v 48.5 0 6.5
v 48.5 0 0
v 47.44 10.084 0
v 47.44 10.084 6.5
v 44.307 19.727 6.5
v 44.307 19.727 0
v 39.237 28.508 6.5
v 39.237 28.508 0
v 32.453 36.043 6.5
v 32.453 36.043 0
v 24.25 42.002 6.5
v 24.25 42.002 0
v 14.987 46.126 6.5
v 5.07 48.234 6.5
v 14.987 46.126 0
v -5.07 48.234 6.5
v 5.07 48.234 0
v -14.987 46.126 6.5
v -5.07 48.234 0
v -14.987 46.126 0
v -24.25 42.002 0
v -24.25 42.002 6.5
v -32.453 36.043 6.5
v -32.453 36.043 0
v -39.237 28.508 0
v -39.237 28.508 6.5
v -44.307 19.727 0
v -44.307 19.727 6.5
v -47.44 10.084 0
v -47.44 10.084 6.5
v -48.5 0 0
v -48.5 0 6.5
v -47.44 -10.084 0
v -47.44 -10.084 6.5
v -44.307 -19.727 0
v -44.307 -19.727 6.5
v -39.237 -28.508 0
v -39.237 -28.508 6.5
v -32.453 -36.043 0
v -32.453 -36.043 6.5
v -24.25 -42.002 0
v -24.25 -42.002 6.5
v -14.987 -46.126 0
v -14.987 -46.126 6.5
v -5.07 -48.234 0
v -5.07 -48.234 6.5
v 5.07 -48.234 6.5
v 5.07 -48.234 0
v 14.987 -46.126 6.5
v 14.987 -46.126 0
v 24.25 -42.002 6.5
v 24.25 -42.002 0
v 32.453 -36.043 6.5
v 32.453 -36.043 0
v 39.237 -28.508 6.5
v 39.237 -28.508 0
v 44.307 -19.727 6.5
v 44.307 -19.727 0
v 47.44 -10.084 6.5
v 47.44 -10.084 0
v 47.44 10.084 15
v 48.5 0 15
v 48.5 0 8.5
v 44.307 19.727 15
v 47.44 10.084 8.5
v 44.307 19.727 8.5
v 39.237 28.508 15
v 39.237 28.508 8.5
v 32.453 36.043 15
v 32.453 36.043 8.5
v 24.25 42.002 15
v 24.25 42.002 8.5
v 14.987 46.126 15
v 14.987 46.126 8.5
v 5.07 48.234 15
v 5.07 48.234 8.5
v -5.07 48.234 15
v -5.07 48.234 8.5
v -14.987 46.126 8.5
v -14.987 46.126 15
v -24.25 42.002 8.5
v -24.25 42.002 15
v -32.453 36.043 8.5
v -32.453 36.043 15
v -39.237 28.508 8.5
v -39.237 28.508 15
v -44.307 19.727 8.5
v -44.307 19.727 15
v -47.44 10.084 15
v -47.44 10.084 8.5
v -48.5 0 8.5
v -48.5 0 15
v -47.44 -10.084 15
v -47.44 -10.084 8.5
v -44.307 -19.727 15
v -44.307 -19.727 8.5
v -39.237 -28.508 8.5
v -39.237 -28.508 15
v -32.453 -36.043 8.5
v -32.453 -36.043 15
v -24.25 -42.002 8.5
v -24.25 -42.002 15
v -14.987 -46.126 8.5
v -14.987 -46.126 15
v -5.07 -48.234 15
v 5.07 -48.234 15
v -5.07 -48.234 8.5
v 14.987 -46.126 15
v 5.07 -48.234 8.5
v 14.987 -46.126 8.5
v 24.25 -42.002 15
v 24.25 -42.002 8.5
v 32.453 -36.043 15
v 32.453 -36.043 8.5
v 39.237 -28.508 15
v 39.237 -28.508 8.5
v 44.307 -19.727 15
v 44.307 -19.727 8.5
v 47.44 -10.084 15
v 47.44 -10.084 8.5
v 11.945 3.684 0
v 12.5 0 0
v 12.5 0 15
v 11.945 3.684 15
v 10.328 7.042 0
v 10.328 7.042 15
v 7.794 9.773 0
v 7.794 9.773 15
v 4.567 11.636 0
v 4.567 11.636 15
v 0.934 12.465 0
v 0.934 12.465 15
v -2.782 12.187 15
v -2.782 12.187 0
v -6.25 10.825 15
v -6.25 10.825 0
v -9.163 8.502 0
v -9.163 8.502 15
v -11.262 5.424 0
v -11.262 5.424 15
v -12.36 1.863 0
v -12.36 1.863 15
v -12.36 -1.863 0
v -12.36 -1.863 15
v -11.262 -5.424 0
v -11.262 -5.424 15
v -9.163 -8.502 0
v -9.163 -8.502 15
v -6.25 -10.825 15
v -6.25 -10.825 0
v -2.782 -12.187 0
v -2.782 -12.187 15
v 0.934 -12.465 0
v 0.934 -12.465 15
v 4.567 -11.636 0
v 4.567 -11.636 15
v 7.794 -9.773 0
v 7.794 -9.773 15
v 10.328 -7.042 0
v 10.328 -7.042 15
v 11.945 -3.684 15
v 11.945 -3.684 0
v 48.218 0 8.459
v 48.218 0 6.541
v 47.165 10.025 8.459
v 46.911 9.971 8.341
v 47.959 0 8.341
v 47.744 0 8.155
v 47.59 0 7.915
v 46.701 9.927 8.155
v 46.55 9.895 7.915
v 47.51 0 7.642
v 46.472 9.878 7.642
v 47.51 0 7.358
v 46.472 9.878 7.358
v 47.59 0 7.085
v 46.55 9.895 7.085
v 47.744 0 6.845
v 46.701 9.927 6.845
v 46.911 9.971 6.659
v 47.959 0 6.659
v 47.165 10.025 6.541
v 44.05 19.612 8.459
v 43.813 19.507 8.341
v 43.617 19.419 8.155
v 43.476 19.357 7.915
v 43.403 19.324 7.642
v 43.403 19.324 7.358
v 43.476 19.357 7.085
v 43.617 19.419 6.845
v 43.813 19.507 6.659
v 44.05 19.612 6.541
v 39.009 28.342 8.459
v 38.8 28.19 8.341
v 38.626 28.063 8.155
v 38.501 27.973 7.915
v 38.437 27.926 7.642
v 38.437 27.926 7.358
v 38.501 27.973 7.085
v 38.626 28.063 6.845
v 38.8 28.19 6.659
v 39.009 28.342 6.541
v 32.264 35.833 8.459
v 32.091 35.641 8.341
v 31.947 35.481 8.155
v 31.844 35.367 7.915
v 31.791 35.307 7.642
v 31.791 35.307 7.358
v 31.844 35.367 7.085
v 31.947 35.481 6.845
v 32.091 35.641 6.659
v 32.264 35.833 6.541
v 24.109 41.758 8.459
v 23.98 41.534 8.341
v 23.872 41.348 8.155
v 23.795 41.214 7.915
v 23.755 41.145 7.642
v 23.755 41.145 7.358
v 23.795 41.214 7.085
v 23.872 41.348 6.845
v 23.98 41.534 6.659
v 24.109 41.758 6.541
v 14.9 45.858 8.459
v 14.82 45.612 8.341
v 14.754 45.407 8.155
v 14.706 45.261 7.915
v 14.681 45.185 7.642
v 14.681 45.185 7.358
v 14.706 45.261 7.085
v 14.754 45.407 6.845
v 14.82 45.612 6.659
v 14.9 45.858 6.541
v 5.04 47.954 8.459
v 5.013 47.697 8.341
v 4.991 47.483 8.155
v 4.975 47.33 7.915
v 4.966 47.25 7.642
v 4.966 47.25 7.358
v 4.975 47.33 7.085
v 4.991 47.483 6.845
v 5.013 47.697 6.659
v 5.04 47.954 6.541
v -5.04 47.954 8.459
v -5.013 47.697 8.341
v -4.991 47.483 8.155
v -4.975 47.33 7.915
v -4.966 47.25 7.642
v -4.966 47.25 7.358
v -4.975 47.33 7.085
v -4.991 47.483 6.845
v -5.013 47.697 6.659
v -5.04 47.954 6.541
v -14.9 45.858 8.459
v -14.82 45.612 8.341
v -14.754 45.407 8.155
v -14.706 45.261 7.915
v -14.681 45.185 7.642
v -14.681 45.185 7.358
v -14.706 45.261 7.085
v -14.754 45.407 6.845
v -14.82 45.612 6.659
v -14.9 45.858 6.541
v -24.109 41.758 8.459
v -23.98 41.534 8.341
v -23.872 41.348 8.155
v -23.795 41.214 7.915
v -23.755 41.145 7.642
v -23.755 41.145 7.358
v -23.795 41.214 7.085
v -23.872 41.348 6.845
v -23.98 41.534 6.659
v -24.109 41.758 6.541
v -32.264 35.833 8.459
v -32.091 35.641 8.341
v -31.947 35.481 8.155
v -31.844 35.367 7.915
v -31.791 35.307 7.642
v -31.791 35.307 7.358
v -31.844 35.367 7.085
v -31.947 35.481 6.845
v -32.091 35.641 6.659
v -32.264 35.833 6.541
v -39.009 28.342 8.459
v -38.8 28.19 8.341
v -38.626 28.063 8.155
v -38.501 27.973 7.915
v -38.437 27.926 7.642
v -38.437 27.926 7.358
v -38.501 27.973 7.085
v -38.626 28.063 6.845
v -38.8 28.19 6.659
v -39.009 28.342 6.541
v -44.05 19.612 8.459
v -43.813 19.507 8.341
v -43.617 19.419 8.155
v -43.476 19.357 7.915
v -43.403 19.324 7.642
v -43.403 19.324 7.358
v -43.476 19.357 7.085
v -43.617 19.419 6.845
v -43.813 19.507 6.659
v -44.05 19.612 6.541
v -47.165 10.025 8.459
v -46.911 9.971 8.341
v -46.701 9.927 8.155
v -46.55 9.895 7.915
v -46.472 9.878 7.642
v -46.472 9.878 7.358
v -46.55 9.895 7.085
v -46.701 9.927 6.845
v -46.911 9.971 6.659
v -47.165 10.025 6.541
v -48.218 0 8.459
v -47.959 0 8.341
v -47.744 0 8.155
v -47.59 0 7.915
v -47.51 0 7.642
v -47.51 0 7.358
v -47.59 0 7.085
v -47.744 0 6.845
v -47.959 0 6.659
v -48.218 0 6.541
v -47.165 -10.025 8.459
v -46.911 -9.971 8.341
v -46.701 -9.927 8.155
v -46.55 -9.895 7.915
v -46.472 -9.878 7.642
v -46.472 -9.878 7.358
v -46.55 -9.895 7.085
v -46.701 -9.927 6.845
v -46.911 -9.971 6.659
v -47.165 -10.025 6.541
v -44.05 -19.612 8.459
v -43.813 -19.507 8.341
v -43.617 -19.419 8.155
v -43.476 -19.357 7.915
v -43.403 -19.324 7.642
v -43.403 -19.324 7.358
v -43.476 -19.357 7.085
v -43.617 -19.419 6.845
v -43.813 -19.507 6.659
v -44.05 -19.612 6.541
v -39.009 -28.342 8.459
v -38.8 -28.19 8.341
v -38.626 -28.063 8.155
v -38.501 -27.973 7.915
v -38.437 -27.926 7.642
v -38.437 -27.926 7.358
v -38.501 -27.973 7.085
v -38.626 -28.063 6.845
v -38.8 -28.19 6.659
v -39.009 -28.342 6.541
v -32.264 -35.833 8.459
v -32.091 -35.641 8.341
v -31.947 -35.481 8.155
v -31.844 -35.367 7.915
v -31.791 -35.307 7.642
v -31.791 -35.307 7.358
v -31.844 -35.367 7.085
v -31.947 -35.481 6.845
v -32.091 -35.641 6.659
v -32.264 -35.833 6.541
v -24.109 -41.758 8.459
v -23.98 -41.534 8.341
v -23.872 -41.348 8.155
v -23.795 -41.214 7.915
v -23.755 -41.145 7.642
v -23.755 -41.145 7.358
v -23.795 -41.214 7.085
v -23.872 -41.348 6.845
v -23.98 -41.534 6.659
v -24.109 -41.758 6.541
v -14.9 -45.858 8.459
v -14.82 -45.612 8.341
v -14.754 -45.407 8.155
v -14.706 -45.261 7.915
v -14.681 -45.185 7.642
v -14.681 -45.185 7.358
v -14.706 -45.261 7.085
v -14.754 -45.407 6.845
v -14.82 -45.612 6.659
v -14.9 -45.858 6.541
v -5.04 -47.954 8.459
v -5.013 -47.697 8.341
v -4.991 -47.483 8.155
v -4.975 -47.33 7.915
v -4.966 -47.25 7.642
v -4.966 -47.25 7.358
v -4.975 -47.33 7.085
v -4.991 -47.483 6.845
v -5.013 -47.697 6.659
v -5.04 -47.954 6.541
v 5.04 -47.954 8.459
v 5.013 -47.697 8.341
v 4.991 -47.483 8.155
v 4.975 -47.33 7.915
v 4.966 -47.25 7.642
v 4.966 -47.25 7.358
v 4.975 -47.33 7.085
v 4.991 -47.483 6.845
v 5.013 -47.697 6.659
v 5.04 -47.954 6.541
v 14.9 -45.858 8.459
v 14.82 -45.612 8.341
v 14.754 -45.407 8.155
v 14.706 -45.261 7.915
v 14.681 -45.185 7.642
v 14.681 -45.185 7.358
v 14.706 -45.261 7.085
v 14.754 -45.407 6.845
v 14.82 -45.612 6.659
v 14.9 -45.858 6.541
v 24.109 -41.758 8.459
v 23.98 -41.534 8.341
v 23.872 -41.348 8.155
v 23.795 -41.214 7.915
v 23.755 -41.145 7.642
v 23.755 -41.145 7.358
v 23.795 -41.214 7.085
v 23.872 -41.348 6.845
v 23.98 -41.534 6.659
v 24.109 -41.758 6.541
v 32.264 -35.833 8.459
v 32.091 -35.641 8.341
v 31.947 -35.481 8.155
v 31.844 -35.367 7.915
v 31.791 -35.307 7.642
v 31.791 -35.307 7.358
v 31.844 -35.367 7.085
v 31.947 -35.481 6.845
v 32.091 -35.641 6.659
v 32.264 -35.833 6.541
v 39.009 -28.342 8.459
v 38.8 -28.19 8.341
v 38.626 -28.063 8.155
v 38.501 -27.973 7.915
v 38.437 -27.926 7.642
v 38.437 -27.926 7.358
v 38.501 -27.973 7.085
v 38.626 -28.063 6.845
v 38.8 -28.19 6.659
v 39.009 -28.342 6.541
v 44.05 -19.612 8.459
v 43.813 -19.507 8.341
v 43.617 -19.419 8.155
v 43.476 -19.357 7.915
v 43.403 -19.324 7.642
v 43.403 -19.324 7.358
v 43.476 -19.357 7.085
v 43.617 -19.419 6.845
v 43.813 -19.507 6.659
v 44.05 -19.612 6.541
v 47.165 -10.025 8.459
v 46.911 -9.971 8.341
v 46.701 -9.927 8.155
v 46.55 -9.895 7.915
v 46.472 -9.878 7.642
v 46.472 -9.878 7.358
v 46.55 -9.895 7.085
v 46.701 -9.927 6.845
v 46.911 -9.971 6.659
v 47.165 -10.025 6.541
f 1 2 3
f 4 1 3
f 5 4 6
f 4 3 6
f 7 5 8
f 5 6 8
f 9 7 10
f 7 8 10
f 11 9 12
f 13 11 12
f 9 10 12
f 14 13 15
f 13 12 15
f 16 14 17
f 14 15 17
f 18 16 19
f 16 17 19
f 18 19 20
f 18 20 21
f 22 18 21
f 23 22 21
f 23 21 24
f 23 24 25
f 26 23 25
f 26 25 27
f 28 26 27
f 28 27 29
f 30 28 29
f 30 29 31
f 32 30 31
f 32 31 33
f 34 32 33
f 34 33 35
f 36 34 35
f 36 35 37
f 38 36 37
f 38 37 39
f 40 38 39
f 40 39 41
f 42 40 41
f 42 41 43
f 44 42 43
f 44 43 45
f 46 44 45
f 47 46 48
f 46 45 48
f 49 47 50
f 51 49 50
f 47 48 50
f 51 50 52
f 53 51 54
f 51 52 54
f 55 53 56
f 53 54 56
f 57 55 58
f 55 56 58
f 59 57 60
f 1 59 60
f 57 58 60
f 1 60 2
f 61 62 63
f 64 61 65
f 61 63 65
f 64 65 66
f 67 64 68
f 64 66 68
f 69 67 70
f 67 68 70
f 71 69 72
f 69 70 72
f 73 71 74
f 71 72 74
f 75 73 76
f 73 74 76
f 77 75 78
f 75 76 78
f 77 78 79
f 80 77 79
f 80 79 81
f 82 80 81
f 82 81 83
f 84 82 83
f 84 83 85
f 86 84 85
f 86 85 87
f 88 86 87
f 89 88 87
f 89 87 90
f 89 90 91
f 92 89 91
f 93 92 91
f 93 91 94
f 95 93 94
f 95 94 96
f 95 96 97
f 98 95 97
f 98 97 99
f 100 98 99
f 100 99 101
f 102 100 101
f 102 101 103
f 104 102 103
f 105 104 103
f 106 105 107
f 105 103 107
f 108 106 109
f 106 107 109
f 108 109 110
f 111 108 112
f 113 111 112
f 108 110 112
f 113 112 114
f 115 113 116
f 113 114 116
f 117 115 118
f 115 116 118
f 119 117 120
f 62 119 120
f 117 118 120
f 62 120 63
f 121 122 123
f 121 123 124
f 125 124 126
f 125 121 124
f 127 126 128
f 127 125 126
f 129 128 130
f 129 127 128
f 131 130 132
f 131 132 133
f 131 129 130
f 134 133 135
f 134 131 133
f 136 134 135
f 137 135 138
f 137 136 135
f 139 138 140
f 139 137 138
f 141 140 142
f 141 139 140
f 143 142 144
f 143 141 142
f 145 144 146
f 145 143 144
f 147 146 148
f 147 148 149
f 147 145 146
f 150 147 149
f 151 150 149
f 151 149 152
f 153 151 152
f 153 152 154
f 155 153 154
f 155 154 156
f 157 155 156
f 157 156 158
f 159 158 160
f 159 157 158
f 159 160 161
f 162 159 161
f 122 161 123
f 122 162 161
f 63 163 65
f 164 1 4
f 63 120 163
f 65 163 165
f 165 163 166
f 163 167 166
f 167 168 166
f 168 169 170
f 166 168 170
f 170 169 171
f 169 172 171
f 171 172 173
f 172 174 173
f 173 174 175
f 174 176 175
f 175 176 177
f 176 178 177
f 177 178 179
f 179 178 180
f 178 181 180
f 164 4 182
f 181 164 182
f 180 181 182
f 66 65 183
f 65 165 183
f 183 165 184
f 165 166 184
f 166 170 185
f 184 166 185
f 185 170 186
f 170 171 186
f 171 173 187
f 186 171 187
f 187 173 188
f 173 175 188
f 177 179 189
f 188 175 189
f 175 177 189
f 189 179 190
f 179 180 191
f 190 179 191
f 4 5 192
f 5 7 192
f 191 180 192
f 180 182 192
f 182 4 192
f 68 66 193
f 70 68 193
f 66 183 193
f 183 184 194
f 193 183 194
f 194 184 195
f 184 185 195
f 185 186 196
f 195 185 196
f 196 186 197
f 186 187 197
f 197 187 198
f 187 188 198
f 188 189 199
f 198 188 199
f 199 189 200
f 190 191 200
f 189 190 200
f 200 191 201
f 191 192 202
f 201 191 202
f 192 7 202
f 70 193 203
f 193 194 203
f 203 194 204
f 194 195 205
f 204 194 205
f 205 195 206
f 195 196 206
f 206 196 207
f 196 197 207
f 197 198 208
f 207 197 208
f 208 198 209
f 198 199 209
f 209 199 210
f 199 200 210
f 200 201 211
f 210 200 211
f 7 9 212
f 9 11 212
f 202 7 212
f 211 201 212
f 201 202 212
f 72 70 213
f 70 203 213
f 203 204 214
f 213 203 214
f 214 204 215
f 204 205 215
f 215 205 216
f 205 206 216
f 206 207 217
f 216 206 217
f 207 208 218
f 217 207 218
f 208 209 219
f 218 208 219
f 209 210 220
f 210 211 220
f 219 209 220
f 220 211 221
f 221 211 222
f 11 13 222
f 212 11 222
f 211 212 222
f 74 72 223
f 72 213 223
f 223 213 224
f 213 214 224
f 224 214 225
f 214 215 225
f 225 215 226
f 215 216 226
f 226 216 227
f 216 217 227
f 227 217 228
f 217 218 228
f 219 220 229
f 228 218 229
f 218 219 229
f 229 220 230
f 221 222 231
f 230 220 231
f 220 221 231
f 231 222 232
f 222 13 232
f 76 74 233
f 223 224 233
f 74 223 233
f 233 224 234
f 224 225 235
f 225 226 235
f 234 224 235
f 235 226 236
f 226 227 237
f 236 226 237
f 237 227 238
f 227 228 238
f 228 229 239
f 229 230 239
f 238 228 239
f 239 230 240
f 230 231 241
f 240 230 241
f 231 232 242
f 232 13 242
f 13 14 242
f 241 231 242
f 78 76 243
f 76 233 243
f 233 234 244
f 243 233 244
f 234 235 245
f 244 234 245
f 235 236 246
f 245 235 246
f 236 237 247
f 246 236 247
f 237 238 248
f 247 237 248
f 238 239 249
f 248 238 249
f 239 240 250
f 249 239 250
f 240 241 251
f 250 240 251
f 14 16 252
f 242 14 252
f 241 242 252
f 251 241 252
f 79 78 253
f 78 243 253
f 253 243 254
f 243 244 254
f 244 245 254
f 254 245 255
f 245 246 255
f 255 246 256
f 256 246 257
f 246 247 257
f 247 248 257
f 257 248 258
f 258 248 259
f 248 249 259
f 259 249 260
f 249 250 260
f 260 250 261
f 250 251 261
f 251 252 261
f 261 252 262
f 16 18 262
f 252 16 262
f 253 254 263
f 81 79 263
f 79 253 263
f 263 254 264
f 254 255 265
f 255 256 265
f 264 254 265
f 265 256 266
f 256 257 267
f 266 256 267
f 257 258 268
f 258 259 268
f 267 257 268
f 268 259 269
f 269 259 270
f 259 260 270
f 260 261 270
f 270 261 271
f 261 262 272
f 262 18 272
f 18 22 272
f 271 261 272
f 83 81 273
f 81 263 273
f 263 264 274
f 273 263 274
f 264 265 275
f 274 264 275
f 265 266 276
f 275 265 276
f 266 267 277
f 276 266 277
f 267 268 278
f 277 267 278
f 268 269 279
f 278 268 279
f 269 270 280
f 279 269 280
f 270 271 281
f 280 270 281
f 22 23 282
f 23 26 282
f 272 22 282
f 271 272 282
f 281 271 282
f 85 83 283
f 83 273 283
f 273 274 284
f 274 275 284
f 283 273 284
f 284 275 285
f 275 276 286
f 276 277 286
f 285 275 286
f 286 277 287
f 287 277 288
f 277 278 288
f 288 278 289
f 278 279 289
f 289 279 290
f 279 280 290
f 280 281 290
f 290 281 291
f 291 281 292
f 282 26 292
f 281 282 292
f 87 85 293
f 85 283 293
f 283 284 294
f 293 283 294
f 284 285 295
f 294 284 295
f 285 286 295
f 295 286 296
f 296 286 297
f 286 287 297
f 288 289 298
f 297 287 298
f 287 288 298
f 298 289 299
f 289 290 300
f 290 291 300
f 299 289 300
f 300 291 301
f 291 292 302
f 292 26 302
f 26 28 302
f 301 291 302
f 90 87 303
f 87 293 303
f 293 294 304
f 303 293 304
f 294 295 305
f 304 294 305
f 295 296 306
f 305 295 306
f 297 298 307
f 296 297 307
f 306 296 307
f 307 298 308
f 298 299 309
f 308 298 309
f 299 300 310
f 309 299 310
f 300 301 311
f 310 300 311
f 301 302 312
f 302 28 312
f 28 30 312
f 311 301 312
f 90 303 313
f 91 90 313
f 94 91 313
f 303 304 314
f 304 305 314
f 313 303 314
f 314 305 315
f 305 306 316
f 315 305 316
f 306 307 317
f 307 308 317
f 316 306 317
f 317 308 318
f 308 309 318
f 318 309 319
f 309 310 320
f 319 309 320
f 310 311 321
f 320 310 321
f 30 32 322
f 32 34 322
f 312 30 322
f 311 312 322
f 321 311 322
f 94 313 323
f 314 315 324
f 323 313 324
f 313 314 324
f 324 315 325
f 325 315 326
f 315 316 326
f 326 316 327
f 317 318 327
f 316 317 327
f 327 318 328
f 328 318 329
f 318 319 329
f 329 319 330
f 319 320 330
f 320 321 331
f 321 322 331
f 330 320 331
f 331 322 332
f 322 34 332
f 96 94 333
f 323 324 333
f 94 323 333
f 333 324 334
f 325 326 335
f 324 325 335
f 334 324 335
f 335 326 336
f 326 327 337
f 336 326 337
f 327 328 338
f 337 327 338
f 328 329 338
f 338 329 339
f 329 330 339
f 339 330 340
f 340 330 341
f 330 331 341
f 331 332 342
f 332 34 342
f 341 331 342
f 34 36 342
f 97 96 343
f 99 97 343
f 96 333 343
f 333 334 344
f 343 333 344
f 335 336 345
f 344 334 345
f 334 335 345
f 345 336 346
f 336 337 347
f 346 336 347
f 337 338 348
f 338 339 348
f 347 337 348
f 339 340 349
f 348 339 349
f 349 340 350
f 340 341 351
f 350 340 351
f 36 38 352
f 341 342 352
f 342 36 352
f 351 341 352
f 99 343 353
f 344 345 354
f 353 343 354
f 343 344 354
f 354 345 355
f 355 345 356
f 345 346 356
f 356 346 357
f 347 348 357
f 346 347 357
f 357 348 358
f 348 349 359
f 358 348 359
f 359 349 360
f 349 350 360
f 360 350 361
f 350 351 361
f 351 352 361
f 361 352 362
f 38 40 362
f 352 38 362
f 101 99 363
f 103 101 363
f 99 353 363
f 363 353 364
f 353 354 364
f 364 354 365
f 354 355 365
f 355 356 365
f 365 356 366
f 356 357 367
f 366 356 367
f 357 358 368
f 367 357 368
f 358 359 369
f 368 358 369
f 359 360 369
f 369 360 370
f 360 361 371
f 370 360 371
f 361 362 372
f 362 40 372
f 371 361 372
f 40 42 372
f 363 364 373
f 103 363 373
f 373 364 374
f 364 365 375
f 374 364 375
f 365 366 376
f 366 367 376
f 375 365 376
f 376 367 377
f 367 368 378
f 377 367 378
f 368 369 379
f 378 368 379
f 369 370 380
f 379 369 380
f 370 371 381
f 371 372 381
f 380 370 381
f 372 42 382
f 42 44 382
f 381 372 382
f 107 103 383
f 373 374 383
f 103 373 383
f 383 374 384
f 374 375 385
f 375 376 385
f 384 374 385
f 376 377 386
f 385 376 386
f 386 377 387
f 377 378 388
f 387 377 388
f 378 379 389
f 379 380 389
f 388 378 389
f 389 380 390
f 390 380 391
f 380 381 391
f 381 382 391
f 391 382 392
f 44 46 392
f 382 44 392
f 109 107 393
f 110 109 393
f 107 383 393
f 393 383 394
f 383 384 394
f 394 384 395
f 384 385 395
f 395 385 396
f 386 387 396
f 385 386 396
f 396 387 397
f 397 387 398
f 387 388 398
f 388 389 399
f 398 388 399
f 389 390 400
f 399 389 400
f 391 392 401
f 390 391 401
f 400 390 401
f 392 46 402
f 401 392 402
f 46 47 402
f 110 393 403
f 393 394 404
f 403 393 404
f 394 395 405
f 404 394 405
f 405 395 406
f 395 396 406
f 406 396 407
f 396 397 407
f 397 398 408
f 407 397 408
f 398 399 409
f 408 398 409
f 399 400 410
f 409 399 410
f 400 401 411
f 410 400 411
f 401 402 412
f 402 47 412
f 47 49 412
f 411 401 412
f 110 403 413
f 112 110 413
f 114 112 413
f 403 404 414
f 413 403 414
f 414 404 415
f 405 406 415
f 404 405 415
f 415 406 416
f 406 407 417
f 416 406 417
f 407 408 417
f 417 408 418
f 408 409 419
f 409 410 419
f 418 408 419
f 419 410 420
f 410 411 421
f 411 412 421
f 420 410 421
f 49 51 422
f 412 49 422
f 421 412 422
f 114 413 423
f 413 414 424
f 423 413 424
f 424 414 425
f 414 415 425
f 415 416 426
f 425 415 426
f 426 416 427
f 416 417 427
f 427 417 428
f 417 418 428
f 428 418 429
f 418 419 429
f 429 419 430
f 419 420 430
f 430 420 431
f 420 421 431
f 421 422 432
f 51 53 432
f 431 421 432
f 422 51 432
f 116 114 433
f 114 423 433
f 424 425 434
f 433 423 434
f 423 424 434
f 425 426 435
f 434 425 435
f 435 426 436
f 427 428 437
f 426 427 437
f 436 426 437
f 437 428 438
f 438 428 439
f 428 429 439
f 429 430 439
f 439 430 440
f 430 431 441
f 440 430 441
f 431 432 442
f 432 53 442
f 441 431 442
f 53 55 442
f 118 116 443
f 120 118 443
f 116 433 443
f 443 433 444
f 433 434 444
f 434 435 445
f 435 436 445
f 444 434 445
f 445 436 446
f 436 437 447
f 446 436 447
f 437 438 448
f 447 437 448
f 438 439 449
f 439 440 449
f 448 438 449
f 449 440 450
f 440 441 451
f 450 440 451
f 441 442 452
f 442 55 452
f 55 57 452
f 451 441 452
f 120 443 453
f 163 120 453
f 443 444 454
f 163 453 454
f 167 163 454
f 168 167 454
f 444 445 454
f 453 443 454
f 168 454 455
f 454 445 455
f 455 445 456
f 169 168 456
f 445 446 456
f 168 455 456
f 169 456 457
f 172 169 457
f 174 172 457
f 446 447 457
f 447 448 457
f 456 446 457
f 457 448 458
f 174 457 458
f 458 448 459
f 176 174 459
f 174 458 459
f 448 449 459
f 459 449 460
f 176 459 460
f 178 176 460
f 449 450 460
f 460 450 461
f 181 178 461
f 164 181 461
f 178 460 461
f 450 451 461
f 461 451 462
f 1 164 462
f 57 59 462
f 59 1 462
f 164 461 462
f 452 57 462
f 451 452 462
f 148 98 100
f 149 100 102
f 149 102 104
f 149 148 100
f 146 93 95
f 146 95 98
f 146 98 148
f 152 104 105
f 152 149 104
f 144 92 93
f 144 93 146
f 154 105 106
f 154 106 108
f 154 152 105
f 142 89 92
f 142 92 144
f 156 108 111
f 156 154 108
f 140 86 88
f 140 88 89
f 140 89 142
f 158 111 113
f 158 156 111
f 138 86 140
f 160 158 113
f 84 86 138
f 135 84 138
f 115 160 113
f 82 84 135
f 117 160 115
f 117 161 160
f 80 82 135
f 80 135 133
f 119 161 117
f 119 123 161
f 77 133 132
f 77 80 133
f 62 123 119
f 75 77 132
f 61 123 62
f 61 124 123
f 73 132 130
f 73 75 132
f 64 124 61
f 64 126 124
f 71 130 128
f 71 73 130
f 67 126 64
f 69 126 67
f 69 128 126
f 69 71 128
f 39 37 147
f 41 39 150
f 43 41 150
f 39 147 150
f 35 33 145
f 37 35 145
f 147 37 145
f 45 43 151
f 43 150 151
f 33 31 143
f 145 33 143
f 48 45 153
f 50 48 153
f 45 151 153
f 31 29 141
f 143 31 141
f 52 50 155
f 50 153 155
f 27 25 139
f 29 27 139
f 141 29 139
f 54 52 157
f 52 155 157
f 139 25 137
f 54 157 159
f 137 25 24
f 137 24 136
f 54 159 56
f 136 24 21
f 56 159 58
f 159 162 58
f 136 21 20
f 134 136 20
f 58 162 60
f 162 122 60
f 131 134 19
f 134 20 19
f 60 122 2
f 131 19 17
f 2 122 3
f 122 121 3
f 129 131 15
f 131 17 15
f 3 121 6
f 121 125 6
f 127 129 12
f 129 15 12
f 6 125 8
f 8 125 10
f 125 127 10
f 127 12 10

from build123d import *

# Parameters (mm, degrees)
F1_R     = 48.5
F2_DEPTH = 15
F5_R     = 12.5
F6_DEPTH = 15


with BuildPart() as f2:
    # F1 (on face) → F2 (new body)
    with BuildSketch(Plane.XY):
        Circle(F1_R)
    extrude(amount=F2_DEPTH)

    # F3 (on Front) → F4 (revolve, cut)
    with BuildSketch(Plane.XZ):
        with BuildLine():
            ThreePointArc((47.5, 7.5), (48.5, 6.5), (49.5, 7.5))
            ThreePointArc((49.5, 7.5), (48.5, 8.5), (47.5, 7.5))
        make_face()
    revolve(axis=Axis((0, 0, 8.376576), (0, 0, 1)), mode=Mode.SUBTRACT)

    # F5 (on Top) → F6 (cut)
    with BuildSketch(Plane.XY):
        Circle(F5_R)
    extrude(amount=F6_DEPTH, mode=Mode.SUBTRACT)


solid = f2.part
